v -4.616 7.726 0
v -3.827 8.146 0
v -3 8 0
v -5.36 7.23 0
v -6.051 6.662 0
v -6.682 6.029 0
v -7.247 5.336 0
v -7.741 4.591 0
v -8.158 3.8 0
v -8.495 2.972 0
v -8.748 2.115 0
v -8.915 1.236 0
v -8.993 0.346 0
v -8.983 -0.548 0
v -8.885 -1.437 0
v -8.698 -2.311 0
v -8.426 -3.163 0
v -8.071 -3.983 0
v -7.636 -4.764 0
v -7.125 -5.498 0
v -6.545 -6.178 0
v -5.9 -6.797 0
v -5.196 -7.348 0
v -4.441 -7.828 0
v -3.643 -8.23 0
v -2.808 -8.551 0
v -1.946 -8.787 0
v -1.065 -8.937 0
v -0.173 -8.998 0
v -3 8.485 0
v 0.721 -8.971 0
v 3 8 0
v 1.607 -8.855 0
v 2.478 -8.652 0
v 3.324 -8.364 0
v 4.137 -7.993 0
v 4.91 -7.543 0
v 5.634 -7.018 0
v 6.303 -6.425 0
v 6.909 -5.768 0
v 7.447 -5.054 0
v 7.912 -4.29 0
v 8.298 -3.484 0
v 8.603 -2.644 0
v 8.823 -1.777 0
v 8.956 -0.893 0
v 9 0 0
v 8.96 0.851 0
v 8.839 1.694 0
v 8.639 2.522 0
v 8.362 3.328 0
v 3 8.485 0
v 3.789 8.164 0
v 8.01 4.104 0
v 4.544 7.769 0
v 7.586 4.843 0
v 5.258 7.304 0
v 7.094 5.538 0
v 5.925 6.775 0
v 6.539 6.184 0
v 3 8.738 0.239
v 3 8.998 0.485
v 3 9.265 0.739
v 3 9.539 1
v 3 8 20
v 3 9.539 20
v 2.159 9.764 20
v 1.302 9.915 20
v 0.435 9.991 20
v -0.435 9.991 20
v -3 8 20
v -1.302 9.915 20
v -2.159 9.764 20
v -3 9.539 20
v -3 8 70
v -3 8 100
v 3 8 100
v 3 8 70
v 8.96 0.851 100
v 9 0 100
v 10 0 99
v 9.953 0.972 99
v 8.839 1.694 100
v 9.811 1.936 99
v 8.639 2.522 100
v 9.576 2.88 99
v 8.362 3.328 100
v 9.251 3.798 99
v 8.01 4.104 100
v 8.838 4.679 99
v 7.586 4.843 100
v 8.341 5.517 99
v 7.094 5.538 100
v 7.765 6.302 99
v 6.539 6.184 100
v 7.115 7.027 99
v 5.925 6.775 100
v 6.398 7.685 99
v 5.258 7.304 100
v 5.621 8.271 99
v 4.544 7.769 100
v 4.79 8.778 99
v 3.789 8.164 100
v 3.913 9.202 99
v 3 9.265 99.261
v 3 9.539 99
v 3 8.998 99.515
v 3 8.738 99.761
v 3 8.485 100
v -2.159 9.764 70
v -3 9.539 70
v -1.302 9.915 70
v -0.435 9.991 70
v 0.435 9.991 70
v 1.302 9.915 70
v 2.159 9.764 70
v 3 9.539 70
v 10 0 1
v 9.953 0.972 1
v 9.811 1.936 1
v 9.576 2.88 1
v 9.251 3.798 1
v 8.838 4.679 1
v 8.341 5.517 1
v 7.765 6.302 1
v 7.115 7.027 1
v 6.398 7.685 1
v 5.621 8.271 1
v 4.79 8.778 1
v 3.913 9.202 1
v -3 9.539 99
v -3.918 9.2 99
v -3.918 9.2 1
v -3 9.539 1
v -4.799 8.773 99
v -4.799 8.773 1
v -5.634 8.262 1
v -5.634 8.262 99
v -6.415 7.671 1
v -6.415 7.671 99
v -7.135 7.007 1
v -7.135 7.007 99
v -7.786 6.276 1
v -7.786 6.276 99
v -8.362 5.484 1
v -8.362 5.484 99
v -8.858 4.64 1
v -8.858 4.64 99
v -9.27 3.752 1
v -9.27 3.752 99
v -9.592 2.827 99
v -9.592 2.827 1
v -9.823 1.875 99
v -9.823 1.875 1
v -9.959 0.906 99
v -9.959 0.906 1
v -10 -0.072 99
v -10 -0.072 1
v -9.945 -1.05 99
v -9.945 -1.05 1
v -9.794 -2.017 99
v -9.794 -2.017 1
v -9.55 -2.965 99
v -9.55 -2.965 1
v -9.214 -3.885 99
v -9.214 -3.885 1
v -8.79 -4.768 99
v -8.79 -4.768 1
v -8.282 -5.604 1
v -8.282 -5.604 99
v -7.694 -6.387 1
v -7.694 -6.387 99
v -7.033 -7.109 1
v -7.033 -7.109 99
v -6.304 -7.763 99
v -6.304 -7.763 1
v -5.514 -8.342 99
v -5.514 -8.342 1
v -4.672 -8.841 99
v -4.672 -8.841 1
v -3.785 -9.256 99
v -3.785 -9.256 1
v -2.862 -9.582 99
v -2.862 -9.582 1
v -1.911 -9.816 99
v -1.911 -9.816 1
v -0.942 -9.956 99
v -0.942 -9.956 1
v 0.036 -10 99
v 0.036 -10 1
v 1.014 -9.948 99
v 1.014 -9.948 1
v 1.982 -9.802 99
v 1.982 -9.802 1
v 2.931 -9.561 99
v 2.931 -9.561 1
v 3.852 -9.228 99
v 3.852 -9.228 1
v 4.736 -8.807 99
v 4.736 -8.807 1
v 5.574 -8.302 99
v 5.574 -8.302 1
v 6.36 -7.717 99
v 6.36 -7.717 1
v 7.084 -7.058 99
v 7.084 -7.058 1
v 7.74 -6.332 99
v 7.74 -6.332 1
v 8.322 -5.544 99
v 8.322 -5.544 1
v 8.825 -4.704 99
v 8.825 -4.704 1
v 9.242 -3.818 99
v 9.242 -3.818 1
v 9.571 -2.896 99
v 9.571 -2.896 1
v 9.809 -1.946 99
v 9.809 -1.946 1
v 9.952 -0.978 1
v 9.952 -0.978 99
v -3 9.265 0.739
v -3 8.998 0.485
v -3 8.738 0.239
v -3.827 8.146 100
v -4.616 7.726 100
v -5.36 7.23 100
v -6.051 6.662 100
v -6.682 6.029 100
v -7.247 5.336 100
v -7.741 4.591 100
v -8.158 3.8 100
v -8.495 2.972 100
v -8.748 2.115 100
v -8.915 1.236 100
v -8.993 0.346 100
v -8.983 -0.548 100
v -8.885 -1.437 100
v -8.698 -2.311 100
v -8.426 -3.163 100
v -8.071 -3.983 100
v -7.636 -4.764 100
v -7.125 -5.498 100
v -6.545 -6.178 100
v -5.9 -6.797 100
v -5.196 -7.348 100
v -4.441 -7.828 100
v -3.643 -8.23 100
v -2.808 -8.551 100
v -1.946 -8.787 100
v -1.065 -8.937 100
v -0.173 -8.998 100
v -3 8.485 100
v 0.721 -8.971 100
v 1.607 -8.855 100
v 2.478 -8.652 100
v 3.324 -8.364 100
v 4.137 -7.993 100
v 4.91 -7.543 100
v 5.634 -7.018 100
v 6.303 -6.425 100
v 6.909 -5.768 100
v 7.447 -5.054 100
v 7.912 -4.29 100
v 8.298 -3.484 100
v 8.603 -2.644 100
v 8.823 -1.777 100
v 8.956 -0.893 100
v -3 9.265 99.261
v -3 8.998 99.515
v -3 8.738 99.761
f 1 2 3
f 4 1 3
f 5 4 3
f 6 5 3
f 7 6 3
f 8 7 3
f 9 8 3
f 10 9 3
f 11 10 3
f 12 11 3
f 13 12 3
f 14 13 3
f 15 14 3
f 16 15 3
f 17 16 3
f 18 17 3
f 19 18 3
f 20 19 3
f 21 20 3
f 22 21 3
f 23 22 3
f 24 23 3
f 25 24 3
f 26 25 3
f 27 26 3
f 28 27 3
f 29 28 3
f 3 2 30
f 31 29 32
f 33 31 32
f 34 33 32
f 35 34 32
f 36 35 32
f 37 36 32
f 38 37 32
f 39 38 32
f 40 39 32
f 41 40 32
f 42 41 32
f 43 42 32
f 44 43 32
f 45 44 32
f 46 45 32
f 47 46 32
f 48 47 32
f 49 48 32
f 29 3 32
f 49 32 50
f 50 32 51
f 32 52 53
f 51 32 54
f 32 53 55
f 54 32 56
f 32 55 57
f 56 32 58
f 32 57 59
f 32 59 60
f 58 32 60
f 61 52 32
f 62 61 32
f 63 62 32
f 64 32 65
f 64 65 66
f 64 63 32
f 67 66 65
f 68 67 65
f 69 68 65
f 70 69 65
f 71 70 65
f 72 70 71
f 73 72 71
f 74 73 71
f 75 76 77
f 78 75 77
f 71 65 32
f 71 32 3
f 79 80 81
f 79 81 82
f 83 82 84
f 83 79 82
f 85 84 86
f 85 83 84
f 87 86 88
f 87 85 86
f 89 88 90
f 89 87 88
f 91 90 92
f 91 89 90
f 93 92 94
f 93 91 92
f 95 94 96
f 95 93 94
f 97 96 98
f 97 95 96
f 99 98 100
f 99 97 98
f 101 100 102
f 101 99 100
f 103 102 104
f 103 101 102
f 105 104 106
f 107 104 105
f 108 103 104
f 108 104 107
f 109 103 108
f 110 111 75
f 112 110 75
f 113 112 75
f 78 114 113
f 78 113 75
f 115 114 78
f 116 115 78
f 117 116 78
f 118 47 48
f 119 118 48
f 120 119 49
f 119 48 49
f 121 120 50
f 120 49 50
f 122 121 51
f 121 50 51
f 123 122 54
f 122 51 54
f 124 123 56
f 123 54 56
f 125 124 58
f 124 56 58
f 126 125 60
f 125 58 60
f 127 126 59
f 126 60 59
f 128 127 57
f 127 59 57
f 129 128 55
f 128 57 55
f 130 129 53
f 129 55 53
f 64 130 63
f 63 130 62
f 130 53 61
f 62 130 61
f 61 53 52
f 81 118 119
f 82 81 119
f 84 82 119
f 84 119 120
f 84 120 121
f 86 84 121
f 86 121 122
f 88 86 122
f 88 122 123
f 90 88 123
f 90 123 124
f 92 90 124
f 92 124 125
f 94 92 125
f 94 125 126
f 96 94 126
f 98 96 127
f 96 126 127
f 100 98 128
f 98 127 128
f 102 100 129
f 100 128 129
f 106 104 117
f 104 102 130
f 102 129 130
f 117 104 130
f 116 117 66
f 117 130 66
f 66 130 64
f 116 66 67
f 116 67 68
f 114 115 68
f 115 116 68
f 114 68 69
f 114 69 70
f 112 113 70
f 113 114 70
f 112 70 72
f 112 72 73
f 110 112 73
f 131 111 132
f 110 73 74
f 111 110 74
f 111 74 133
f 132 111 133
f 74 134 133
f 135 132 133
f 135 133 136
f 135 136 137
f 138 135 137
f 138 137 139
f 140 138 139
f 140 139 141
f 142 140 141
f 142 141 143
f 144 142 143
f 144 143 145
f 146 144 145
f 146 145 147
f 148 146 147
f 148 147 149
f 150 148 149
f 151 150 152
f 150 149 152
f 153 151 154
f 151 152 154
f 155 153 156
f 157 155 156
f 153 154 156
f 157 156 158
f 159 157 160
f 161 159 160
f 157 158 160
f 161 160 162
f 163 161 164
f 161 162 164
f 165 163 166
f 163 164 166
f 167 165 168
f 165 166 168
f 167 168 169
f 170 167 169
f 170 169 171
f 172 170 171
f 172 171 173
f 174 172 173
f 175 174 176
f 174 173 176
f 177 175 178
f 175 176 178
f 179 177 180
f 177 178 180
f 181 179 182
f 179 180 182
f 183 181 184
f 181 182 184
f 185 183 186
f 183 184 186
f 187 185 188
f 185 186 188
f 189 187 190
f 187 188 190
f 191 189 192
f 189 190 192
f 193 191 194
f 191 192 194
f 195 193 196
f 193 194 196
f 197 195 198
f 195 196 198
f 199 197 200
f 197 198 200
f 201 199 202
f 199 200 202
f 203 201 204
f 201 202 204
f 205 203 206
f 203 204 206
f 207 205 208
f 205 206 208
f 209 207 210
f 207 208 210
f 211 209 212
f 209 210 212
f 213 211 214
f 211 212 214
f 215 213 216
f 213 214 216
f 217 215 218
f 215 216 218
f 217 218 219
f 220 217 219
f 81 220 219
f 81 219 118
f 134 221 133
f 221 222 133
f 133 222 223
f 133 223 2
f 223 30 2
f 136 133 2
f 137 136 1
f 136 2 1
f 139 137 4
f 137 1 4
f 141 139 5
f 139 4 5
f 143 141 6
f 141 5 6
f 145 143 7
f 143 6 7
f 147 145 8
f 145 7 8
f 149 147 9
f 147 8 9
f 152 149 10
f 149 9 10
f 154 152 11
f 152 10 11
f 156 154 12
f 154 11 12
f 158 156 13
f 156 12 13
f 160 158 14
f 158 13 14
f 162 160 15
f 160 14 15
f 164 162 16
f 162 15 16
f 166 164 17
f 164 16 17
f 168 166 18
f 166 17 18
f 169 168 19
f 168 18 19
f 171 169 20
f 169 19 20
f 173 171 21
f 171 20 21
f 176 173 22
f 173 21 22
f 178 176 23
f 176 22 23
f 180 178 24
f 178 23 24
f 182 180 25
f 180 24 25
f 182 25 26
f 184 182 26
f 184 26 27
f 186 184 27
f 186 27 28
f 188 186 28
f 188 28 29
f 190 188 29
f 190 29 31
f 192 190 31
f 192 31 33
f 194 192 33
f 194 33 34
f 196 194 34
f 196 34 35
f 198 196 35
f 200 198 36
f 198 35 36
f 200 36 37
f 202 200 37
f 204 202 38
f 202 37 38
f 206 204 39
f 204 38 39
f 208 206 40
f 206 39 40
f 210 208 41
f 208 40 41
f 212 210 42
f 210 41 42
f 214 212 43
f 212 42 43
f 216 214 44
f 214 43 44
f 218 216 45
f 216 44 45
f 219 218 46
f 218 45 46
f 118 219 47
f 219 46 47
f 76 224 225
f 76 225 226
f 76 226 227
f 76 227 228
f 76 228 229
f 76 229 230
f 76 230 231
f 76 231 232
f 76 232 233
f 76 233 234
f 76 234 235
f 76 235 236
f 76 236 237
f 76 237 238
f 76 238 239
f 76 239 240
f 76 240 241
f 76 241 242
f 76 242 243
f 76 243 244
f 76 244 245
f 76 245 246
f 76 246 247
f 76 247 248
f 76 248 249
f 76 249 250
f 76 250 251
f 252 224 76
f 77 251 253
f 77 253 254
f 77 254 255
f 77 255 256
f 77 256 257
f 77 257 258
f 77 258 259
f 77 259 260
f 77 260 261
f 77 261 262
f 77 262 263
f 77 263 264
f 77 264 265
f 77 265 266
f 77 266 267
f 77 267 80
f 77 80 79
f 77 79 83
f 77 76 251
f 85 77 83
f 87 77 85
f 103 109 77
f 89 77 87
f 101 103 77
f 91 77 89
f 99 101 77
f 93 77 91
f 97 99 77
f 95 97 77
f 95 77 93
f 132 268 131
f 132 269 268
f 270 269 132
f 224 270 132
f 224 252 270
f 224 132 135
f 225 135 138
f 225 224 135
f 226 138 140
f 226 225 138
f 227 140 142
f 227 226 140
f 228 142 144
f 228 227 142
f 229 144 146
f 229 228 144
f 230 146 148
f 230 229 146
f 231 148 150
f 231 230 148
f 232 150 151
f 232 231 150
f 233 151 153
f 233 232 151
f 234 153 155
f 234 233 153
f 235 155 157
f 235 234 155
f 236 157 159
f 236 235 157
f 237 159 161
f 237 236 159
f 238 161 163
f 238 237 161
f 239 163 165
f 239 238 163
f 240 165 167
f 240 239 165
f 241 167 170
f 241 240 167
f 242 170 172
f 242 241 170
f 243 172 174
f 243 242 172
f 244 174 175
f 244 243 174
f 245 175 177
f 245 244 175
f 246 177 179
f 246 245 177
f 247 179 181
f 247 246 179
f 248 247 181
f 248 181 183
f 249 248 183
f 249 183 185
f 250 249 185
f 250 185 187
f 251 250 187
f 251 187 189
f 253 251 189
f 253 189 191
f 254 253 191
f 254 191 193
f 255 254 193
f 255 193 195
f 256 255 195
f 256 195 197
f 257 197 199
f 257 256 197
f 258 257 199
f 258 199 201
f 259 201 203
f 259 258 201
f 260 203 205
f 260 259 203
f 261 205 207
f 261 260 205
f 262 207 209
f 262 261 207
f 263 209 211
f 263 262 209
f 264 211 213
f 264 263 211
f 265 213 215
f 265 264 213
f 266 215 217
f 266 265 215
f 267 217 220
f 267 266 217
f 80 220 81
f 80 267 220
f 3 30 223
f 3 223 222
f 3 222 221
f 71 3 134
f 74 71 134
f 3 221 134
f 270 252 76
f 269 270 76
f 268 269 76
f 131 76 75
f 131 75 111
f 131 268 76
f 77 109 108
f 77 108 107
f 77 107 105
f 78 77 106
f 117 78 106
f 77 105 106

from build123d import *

# Parameters (mm, degrees)
SKETCH1_R           = 10
BOSS_EXTRUDE1_DEPTH = 100
SKETCH2_W           = 6
SKETCH2_H           = 2.85006478
CUT_EXTRUDE1_DEPTH  = 30
SKETCH3_W           = 6
SKETCH3_H           = 2.660897005
CUT_EXTRUDE2_DEPTH  = 20
CHAMFER1_SIZE       = 1


with BuildPart() as part:
    # Sketch1 → Boss-Extrude1 (new body)
    with BuildSketch(Plane.XY):
        Circle(SKETCH1_R)
    extrude(amount=BOSS_EXTRUDE1_DEPTH)

    # Sketch2 → Cut-Extrude1 (cut)
    with BuildSketch(Plane.XY.offset(100)):
        with Locations((0, 9.42503239)):
            Rectangle(SKETCH2_W, SKETCH2_H)
    extrude(amount=-CUT_EXTRUDE1_DEPTH, mode=Mode.SUBTRACT)

    # Sketch3 → Cut-Extrude2 (cut)
    with BuildSketch(Plane(origin=(0, 0, 0), x_dir=(-1, 0, 0), z_dir=(0, 0, -1))):
        with Locations((0, 9.330448503)):
            Rectangle(SKETCH3_W, SKETCH3_H)
    extrude(amount=-CUT_EXTRUDE2_DEPTH, mode=Mode.SUBTRACT)

    # Chamfer1
    chamfer1_edges = [part.edges().sort_by_distance(p)[0] for p in [
        (-5.916079783, -8.062257748, 0),
        (-5.916079783, -8.062257748, 100),
    ]]
    chamfer(chamfer1_edges, length=CHAMFER1_SIZE)


solid = part.part
